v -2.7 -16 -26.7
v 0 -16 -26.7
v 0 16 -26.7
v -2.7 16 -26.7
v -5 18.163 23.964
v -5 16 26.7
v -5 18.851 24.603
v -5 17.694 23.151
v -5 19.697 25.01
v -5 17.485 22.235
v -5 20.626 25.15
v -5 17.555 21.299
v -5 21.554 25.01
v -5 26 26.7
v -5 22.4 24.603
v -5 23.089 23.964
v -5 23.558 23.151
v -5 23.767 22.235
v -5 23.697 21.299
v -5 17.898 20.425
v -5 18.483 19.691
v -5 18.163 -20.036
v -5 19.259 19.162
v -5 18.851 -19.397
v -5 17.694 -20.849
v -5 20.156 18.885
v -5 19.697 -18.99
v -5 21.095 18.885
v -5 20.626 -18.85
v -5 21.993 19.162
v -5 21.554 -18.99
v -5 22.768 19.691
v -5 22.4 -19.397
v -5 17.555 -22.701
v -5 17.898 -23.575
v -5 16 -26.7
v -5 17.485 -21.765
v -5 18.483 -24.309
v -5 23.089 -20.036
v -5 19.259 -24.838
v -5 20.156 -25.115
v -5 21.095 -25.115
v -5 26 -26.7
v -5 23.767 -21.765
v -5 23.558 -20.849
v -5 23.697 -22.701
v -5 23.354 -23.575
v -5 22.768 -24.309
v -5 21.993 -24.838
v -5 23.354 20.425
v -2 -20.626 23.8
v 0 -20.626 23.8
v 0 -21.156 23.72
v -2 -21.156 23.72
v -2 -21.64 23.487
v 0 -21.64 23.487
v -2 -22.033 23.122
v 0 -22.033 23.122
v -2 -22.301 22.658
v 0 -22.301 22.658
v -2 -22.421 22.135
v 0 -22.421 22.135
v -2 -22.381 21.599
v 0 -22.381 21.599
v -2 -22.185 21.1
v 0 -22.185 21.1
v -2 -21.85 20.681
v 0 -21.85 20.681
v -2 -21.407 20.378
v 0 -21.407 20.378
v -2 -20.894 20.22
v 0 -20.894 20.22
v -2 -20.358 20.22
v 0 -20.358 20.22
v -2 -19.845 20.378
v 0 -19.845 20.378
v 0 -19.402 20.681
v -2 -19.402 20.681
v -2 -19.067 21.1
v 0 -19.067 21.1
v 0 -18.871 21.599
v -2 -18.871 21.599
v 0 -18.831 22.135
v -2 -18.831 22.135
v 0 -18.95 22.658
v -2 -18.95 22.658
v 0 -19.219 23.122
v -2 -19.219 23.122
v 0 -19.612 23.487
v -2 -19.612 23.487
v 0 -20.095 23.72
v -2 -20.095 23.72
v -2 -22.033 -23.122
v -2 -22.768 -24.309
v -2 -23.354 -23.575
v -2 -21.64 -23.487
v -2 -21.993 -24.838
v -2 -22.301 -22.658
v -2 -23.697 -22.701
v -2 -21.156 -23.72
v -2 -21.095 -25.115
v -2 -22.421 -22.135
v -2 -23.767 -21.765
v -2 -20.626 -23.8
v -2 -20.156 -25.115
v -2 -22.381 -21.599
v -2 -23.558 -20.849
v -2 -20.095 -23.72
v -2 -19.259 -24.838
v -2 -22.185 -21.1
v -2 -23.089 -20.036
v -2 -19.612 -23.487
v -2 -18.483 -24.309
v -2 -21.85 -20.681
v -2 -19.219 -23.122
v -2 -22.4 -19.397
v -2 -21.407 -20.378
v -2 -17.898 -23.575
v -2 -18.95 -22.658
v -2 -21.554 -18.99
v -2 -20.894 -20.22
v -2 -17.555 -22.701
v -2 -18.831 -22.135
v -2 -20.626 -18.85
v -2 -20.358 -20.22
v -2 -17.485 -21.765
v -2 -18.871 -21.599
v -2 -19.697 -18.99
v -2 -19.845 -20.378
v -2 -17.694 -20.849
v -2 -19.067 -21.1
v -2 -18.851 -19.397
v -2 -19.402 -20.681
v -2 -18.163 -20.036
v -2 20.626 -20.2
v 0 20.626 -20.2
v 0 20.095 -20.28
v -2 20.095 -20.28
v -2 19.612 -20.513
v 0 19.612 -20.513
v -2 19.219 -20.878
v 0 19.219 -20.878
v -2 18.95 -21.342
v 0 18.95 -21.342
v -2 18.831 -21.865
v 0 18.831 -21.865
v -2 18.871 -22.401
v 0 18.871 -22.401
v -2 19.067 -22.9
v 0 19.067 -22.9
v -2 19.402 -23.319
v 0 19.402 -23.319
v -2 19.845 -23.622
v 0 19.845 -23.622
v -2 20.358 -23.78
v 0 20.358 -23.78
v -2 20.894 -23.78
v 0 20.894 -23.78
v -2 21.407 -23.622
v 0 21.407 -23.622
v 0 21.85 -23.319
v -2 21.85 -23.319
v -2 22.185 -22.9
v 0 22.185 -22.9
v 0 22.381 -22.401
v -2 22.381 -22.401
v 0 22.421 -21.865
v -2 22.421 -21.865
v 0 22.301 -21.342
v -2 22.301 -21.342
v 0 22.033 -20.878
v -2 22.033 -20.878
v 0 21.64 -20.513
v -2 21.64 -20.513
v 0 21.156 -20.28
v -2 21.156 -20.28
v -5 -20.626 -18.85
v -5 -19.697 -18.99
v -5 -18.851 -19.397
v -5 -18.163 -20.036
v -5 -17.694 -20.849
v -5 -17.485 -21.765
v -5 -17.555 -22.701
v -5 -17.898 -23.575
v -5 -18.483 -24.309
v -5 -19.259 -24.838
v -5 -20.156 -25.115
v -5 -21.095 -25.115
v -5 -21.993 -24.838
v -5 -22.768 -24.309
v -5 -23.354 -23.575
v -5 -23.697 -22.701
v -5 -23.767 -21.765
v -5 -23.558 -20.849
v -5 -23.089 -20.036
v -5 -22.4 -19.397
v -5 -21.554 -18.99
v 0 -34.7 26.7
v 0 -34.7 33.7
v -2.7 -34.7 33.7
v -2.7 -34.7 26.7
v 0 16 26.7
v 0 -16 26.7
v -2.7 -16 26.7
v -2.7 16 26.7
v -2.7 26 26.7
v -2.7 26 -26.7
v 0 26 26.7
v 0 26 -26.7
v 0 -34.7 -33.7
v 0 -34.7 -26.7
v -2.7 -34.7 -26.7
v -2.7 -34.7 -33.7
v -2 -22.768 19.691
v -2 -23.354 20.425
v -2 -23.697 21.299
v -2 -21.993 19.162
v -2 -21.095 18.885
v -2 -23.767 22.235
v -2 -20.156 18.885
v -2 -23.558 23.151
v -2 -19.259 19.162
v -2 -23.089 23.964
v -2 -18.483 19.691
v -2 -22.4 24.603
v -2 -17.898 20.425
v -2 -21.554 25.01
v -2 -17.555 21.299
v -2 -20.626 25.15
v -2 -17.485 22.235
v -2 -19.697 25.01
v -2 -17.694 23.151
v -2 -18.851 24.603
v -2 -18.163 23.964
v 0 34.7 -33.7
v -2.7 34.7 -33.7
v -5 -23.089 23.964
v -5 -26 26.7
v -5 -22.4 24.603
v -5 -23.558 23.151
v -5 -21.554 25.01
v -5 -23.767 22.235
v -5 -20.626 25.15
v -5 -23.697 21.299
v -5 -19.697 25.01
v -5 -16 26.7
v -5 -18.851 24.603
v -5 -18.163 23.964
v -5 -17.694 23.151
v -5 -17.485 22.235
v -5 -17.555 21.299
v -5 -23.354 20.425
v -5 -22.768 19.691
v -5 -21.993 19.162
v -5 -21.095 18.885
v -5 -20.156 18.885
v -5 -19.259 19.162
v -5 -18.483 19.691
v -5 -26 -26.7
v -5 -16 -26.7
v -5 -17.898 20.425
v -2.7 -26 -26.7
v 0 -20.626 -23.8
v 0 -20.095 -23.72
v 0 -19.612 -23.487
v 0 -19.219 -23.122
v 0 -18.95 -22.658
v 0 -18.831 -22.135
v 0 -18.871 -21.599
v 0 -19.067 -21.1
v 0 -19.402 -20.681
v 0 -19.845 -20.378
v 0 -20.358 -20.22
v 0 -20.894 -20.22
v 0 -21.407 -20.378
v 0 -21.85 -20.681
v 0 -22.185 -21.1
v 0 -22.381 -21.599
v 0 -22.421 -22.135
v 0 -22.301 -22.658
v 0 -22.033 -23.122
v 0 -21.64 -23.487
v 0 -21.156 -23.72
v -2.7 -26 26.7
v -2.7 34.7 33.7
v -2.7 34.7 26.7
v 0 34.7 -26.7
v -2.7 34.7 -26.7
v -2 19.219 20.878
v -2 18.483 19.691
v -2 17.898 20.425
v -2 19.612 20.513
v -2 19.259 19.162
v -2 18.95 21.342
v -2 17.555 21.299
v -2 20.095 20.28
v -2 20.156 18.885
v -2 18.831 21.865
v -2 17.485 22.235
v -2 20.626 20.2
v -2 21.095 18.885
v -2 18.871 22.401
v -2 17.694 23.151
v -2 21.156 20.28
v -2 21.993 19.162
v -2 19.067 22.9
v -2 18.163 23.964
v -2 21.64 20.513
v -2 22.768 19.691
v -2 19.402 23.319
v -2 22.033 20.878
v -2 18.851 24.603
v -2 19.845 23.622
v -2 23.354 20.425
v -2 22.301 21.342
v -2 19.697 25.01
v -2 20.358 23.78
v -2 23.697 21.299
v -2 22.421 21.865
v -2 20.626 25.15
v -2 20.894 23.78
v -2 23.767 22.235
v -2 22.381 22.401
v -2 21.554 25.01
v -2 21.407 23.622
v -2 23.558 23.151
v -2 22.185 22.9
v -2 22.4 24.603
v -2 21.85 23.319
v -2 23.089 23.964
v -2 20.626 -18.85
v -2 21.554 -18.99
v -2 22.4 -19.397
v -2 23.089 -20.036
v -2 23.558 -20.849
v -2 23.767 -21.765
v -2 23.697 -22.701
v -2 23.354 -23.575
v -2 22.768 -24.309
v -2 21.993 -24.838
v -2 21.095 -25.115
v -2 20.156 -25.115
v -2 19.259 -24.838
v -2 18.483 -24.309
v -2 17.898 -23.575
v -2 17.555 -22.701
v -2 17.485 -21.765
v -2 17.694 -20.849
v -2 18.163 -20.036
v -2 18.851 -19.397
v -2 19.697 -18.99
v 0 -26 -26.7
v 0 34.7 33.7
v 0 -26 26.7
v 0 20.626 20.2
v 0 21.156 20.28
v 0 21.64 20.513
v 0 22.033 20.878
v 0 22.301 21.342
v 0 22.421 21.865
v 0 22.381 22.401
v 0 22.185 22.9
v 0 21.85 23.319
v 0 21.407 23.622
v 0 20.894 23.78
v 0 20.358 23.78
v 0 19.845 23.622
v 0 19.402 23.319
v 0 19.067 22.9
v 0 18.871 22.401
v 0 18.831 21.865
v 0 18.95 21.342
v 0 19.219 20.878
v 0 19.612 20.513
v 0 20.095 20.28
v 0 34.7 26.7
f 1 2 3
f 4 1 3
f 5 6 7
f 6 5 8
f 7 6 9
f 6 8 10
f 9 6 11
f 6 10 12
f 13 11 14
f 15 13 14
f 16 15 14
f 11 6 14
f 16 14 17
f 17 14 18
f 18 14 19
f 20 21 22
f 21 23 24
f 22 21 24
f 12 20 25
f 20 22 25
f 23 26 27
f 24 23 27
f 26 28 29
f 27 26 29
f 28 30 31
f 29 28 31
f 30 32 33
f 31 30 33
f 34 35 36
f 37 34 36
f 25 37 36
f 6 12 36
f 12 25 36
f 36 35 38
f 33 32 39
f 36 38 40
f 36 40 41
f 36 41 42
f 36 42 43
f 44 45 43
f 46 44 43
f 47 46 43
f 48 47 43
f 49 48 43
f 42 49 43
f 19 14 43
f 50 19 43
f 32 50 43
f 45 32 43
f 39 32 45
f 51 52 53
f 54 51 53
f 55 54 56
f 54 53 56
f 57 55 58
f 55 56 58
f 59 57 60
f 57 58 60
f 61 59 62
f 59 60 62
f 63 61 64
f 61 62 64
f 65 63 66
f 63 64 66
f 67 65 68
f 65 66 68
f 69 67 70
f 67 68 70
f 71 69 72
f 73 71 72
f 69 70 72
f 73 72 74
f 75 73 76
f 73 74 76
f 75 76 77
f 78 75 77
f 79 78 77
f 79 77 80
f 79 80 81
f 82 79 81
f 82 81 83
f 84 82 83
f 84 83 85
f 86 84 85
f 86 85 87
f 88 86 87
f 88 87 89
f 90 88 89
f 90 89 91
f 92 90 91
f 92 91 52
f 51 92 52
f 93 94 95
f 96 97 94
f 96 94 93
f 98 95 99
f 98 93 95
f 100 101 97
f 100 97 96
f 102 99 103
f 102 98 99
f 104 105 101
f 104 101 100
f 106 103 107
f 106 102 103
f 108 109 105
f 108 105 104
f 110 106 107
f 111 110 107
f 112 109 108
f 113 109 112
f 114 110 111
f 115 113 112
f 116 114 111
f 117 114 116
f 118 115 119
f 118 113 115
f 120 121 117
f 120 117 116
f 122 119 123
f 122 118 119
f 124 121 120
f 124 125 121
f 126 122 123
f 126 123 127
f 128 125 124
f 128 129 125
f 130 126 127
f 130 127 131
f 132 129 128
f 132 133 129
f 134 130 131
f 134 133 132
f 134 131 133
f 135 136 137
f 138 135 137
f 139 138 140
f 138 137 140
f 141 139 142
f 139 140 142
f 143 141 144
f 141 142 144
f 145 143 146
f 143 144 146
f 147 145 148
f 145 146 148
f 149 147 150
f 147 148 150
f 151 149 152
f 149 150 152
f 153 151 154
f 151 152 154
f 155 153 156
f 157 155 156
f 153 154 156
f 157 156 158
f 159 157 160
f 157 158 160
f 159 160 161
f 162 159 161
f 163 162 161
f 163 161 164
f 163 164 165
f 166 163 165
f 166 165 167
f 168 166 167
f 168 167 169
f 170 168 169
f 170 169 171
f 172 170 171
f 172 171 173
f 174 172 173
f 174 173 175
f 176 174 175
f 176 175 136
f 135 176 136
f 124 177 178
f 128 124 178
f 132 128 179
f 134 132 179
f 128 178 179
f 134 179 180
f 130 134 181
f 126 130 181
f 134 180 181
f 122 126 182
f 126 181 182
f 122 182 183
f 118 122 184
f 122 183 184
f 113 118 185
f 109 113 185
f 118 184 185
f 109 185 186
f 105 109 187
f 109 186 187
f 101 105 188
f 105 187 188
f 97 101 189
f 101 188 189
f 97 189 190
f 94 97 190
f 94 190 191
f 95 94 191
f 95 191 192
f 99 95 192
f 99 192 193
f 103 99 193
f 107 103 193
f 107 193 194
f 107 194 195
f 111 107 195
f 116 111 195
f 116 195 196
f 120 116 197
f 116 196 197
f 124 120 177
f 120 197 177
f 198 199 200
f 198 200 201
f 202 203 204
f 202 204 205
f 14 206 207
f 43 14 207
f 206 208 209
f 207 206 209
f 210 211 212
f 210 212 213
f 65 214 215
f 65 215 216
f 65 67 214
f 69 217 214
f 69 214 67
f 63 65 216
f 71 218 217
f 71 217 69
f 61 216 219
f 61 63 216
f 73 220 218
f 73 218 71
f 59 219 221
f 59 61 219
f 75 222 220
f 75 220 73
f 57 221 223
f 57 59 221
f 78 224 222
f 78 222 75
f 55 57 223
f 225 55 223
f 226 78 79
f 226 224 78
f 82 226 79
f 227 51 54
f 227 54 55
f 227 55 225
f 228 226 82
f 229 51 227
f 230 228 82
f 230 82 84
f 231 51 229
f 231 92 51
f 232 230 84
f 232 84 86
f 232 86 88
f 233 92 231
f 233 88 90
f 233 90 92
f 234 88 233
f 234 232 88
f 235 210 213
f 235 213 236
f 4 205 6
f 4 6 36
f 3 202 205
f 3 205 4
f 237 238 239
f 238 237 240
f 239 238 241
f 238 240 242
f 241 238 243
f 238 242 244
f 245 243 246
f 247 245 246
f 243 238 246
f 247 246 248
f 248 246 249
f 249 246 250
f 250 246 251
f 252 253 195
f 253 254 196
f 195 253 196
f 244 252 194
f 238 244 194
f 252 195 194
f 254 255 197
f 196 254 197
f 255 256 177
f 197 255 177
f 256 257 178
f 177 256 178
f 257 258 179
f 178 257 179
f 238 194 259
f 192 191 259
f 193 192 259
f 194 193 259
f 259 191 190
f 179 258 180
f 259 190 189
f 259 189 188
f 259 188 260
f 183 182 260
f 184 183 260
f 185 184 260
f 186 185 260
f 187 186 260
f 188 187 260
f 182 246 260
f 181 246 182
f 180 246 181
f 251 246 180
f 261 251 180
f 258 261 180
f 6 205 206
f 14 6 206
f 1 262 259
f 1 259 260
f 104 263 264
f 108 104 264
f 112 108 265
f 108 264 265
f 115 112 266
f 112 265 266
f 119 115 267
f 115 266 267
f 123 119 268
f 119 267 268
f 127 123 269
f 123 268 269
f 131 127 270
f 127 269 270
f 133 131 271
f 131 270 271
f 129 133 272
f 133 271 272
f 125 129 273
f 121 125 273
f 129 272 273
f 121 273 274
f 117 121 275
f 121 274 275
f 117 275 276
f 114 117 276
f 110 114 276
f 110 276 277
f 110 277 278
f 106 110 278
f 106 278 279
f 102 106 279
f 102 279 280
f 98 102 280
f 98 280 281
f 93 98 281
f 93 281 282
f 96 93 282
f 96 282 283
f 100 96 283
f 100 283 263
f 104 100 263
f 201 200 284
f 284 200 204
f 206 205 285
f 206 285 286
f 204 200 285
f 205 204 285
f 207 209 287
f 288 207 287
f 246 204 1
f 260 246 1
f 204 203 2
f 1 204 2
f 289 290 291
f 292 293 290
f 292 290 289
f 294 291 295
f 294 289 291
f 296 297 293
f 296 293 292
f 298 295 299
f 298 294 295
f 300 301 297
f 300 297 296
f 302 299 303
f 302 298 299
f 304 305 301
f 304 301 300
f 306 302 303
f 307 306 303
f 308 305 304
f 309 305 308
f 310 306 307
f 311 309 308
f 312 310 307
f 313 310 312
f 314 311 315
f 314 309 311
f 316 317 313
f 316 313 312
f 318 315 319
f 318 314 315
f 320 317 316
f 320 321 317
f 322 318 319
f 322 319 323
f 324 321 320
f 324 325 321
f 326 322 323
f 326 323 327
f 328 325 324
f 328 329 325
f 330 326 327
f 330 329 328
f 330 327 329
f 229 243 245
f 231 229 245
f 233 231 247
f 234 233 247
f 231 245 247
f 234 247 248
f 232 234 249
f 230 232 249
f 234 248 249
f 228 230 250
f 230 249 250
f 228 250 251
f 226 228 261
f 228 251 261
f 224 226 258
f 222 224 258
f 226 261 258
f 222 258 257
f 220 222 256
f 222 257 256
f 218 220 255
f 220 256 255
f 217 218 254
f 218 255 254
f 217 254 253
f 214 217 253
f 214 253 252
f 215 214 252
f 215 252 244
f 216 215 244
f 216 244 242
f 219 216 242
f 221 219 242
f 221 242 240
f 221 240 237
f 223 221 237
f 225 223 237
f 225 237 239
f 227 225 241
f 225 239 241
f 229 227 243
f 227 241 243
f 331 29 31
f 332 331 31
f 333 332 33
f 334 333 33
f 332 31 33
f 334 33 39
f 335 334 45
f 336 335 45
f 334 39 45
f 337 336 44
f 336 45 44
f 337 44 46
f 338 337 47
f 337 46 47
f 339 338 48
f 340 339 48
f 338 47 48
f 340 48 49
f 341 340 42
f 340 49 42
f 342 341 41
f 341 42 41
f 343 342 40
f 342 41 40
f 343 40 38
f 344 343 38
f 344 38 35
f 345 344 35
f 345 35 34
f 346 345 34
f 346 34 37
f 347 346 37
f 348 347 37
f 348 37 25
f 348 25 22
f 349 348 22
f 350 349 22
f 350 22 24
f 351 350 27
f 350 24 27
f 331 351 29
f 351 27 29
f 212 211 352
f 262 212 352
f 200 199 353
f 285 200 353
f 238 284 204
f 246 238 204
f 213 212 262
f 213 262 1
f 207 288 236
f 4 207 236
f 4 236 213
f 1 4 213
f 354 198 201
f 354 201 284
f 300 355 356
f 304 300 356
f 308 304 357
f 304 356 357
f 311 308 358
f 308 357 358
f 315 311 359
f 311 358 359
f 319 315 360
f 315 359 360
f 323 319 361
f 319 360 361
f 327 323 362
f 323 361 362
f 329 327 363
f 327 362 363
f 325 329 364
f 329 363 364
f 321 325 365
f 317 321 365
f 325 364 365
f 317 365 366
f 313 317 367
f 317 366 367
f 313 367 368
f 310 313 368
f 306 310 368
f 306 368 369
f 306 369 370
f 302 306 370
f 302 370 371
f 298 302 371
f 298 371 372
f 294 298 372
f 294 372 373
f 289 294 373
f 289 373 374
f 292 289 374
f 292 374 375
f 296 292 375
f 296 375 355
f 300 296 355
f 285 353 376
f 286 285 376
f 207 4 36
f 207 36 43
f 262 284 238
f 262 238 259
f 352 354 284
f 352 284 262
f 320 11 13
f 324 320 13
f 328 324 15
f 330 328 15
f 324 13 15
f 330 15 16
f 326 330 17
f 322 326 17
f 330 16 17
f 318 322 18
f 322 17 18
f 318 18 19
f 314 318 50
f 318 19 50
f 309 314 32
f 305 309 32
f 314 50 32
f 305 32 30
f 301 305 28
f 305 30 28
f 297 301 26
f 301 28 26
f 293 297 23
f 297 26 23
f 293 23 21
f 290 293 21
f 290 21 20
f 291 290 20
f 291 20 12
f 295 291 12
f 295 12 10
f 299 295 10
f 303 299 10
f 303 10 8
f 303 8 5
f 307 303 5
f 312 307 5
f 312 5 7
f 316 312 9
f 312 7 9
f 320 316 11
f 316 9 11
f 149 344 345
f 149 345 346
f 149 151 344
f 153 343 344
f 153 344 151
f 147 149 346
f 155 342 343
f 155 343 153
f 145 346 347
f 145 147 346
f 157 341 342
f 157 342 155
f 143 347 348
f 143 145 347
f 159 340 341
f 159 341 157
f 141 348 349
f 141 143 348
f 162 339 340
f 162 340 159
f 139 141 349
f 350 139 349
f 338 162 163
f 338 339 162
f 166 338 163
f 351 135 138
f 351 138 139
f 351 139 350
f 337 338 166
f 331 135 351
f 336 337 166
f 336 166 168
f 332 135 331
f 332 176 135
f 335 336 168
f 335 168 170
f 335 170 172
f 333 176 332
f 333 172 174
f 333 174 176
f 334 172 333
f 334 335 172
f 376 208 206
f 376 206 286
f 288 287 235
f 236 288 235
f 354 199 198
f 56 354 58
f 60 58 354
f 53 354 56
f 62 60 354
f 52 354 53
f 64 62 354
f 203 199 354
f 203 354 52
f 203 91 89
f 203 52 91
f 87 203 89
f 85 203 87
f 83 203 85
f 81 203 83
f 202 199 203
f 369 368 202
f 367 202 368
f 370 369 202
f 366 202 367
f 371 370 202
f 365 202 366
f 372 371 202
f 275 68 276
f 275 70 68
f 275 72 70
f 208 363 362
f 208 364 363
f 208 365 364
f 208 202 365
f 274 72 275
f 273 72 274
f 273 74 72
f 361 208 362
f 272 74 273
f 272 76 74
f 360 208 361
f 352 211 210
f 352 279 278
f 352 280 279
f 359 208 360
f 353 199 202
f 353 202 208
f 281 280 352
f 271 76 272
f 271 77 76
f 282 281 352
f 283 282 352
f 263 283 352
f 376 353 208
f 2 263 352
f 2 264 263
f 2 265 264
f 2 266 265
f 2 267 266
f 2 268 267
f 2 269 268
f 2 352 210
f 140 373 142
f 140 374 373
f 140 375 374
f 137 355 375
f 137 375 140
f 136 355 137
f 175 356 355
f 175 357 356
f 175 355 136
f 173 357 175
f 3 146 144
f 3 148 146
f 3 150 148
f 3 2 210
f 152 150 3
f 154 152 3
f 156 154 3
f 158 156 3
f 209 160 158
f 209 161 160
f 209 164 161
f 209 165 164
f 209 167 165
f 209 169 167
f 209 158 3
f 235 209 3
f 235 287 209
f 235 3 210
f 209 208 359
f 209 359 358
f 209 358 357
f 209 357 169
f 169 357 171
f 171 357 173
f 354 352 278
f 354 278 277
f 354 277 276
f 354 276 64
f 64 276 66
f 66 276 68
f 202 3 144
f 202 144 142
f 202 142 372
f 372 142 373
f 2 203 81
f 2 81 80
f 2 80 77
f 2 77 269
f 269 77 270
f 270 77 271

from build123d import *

# Parameters (mm, degrees)
SKETCH1_W             = 7
SKETCH1_H             = 69.4
BOSS_EXTRUDE1_DEPTH   = 2.7
BOSS_EXTRUDE1_2_DEPTH = 2.7
SKETCH1_7_W           = 53.4
SKETCH1_7_H           = 10
SKETCH1_7_R           = 1.8
BOSS_EXTRUDE2_DEPTH   = 5
SKETCH2_R             = 3.15
CUT_EXTRUDE1_DEPTH    = 3


with BuildPart() as part:
    # Sketch1 → Boss-Extrude1 (new body)
    with BuildSketch(Plane(origin=(0, 0, 0), x_dir=(0, 0, -1), z_dir=(1, 0, 0))):
        with Locations((-30.2, 0)):
            Rectangle(SKETCH1_W, SKETCH1_H)
    extrude(amount=-BOSS_EXTRUDE1_DEPTH)



with BuildPart() as body_2:
    # Sketch1 → Boss-Extrude1 2 (new body)
    with BuildSketch(Plane(origin=(0, 0, 0), x_dir=(0, 0, -1), z_dir=(1, 0, 0))):
        with Locations((30.2, 0)):
            Rectangle(SKETCH1_W, SKETCH1_H)
    extrude(amount=-BOSS_EXTRUDE1_2_DEPTH)


with BuildPart() as part_1:
    add(part.part)

    add(body_2.part)  # Boss-Extrude2 merges body 2
    # Sketch1<7> → Boss-Extrude2 (add)
    # profile 1 of 2: a face of its own
    with BuildSketch(Plane(origin=(0, 0, 0), x_dir=(0, 0, -1), z_dir=(1, 0, 0))):
        with Locations((0, 21)):
            Rectangle(SKETCH1_7_W, SKETCH1_7_H)
        with Locations((-22, 20.625876568)):
            Circle(SKETCH1_7_R, mode=Mode.SUBTRACT)
        with Locations((22, 20.625876568)):
            Circle(SKETCH1_7_R, mode=Mode.SUBTRACT)
    # profile 2 of 2: a face of its own
    with BuildSketch(Plane(origin=(0, 0, 0), x_dir=(0, 0, -1), z_dir=(1, 0, 0))):
        with Locations((0, -21)):
            Rectangle(SKETCH1_7_W, SKETCH1_7_H)
        with Locations((22, -20.625876568)):
            Circle(SKETCH1_7_R, mode=Mode.SUBTRACT)
        with Locations((-22, -20.625876568)):
            Circle(SKETCH1_7_R, mode=Mode.SUBTRACT)
    extrude(amount=-BOSS_EXTRUDE2_DEPTH)

    # Sketch2 → Cut-Extrude1 (cut)
    with BuildSketch(Plane.ZY.offset(5)):
        with Locations((-22, 20.625876568)):
            Circle(SKETCH2_R)
        with Locations((22, 20.625876568)):
            Circle(SKETCH2_R)
        with Locations((-22, -20.625876568)):
            Circle(SKETCH2_R)
        with Locations((22, -20.625876568)):
            Circle(SKETCH2_R)
    extrude(amount=-CUT_EXTRUDE1_DEPTH, mode=Mode.SUBTRACT)


solid = part_1.part
